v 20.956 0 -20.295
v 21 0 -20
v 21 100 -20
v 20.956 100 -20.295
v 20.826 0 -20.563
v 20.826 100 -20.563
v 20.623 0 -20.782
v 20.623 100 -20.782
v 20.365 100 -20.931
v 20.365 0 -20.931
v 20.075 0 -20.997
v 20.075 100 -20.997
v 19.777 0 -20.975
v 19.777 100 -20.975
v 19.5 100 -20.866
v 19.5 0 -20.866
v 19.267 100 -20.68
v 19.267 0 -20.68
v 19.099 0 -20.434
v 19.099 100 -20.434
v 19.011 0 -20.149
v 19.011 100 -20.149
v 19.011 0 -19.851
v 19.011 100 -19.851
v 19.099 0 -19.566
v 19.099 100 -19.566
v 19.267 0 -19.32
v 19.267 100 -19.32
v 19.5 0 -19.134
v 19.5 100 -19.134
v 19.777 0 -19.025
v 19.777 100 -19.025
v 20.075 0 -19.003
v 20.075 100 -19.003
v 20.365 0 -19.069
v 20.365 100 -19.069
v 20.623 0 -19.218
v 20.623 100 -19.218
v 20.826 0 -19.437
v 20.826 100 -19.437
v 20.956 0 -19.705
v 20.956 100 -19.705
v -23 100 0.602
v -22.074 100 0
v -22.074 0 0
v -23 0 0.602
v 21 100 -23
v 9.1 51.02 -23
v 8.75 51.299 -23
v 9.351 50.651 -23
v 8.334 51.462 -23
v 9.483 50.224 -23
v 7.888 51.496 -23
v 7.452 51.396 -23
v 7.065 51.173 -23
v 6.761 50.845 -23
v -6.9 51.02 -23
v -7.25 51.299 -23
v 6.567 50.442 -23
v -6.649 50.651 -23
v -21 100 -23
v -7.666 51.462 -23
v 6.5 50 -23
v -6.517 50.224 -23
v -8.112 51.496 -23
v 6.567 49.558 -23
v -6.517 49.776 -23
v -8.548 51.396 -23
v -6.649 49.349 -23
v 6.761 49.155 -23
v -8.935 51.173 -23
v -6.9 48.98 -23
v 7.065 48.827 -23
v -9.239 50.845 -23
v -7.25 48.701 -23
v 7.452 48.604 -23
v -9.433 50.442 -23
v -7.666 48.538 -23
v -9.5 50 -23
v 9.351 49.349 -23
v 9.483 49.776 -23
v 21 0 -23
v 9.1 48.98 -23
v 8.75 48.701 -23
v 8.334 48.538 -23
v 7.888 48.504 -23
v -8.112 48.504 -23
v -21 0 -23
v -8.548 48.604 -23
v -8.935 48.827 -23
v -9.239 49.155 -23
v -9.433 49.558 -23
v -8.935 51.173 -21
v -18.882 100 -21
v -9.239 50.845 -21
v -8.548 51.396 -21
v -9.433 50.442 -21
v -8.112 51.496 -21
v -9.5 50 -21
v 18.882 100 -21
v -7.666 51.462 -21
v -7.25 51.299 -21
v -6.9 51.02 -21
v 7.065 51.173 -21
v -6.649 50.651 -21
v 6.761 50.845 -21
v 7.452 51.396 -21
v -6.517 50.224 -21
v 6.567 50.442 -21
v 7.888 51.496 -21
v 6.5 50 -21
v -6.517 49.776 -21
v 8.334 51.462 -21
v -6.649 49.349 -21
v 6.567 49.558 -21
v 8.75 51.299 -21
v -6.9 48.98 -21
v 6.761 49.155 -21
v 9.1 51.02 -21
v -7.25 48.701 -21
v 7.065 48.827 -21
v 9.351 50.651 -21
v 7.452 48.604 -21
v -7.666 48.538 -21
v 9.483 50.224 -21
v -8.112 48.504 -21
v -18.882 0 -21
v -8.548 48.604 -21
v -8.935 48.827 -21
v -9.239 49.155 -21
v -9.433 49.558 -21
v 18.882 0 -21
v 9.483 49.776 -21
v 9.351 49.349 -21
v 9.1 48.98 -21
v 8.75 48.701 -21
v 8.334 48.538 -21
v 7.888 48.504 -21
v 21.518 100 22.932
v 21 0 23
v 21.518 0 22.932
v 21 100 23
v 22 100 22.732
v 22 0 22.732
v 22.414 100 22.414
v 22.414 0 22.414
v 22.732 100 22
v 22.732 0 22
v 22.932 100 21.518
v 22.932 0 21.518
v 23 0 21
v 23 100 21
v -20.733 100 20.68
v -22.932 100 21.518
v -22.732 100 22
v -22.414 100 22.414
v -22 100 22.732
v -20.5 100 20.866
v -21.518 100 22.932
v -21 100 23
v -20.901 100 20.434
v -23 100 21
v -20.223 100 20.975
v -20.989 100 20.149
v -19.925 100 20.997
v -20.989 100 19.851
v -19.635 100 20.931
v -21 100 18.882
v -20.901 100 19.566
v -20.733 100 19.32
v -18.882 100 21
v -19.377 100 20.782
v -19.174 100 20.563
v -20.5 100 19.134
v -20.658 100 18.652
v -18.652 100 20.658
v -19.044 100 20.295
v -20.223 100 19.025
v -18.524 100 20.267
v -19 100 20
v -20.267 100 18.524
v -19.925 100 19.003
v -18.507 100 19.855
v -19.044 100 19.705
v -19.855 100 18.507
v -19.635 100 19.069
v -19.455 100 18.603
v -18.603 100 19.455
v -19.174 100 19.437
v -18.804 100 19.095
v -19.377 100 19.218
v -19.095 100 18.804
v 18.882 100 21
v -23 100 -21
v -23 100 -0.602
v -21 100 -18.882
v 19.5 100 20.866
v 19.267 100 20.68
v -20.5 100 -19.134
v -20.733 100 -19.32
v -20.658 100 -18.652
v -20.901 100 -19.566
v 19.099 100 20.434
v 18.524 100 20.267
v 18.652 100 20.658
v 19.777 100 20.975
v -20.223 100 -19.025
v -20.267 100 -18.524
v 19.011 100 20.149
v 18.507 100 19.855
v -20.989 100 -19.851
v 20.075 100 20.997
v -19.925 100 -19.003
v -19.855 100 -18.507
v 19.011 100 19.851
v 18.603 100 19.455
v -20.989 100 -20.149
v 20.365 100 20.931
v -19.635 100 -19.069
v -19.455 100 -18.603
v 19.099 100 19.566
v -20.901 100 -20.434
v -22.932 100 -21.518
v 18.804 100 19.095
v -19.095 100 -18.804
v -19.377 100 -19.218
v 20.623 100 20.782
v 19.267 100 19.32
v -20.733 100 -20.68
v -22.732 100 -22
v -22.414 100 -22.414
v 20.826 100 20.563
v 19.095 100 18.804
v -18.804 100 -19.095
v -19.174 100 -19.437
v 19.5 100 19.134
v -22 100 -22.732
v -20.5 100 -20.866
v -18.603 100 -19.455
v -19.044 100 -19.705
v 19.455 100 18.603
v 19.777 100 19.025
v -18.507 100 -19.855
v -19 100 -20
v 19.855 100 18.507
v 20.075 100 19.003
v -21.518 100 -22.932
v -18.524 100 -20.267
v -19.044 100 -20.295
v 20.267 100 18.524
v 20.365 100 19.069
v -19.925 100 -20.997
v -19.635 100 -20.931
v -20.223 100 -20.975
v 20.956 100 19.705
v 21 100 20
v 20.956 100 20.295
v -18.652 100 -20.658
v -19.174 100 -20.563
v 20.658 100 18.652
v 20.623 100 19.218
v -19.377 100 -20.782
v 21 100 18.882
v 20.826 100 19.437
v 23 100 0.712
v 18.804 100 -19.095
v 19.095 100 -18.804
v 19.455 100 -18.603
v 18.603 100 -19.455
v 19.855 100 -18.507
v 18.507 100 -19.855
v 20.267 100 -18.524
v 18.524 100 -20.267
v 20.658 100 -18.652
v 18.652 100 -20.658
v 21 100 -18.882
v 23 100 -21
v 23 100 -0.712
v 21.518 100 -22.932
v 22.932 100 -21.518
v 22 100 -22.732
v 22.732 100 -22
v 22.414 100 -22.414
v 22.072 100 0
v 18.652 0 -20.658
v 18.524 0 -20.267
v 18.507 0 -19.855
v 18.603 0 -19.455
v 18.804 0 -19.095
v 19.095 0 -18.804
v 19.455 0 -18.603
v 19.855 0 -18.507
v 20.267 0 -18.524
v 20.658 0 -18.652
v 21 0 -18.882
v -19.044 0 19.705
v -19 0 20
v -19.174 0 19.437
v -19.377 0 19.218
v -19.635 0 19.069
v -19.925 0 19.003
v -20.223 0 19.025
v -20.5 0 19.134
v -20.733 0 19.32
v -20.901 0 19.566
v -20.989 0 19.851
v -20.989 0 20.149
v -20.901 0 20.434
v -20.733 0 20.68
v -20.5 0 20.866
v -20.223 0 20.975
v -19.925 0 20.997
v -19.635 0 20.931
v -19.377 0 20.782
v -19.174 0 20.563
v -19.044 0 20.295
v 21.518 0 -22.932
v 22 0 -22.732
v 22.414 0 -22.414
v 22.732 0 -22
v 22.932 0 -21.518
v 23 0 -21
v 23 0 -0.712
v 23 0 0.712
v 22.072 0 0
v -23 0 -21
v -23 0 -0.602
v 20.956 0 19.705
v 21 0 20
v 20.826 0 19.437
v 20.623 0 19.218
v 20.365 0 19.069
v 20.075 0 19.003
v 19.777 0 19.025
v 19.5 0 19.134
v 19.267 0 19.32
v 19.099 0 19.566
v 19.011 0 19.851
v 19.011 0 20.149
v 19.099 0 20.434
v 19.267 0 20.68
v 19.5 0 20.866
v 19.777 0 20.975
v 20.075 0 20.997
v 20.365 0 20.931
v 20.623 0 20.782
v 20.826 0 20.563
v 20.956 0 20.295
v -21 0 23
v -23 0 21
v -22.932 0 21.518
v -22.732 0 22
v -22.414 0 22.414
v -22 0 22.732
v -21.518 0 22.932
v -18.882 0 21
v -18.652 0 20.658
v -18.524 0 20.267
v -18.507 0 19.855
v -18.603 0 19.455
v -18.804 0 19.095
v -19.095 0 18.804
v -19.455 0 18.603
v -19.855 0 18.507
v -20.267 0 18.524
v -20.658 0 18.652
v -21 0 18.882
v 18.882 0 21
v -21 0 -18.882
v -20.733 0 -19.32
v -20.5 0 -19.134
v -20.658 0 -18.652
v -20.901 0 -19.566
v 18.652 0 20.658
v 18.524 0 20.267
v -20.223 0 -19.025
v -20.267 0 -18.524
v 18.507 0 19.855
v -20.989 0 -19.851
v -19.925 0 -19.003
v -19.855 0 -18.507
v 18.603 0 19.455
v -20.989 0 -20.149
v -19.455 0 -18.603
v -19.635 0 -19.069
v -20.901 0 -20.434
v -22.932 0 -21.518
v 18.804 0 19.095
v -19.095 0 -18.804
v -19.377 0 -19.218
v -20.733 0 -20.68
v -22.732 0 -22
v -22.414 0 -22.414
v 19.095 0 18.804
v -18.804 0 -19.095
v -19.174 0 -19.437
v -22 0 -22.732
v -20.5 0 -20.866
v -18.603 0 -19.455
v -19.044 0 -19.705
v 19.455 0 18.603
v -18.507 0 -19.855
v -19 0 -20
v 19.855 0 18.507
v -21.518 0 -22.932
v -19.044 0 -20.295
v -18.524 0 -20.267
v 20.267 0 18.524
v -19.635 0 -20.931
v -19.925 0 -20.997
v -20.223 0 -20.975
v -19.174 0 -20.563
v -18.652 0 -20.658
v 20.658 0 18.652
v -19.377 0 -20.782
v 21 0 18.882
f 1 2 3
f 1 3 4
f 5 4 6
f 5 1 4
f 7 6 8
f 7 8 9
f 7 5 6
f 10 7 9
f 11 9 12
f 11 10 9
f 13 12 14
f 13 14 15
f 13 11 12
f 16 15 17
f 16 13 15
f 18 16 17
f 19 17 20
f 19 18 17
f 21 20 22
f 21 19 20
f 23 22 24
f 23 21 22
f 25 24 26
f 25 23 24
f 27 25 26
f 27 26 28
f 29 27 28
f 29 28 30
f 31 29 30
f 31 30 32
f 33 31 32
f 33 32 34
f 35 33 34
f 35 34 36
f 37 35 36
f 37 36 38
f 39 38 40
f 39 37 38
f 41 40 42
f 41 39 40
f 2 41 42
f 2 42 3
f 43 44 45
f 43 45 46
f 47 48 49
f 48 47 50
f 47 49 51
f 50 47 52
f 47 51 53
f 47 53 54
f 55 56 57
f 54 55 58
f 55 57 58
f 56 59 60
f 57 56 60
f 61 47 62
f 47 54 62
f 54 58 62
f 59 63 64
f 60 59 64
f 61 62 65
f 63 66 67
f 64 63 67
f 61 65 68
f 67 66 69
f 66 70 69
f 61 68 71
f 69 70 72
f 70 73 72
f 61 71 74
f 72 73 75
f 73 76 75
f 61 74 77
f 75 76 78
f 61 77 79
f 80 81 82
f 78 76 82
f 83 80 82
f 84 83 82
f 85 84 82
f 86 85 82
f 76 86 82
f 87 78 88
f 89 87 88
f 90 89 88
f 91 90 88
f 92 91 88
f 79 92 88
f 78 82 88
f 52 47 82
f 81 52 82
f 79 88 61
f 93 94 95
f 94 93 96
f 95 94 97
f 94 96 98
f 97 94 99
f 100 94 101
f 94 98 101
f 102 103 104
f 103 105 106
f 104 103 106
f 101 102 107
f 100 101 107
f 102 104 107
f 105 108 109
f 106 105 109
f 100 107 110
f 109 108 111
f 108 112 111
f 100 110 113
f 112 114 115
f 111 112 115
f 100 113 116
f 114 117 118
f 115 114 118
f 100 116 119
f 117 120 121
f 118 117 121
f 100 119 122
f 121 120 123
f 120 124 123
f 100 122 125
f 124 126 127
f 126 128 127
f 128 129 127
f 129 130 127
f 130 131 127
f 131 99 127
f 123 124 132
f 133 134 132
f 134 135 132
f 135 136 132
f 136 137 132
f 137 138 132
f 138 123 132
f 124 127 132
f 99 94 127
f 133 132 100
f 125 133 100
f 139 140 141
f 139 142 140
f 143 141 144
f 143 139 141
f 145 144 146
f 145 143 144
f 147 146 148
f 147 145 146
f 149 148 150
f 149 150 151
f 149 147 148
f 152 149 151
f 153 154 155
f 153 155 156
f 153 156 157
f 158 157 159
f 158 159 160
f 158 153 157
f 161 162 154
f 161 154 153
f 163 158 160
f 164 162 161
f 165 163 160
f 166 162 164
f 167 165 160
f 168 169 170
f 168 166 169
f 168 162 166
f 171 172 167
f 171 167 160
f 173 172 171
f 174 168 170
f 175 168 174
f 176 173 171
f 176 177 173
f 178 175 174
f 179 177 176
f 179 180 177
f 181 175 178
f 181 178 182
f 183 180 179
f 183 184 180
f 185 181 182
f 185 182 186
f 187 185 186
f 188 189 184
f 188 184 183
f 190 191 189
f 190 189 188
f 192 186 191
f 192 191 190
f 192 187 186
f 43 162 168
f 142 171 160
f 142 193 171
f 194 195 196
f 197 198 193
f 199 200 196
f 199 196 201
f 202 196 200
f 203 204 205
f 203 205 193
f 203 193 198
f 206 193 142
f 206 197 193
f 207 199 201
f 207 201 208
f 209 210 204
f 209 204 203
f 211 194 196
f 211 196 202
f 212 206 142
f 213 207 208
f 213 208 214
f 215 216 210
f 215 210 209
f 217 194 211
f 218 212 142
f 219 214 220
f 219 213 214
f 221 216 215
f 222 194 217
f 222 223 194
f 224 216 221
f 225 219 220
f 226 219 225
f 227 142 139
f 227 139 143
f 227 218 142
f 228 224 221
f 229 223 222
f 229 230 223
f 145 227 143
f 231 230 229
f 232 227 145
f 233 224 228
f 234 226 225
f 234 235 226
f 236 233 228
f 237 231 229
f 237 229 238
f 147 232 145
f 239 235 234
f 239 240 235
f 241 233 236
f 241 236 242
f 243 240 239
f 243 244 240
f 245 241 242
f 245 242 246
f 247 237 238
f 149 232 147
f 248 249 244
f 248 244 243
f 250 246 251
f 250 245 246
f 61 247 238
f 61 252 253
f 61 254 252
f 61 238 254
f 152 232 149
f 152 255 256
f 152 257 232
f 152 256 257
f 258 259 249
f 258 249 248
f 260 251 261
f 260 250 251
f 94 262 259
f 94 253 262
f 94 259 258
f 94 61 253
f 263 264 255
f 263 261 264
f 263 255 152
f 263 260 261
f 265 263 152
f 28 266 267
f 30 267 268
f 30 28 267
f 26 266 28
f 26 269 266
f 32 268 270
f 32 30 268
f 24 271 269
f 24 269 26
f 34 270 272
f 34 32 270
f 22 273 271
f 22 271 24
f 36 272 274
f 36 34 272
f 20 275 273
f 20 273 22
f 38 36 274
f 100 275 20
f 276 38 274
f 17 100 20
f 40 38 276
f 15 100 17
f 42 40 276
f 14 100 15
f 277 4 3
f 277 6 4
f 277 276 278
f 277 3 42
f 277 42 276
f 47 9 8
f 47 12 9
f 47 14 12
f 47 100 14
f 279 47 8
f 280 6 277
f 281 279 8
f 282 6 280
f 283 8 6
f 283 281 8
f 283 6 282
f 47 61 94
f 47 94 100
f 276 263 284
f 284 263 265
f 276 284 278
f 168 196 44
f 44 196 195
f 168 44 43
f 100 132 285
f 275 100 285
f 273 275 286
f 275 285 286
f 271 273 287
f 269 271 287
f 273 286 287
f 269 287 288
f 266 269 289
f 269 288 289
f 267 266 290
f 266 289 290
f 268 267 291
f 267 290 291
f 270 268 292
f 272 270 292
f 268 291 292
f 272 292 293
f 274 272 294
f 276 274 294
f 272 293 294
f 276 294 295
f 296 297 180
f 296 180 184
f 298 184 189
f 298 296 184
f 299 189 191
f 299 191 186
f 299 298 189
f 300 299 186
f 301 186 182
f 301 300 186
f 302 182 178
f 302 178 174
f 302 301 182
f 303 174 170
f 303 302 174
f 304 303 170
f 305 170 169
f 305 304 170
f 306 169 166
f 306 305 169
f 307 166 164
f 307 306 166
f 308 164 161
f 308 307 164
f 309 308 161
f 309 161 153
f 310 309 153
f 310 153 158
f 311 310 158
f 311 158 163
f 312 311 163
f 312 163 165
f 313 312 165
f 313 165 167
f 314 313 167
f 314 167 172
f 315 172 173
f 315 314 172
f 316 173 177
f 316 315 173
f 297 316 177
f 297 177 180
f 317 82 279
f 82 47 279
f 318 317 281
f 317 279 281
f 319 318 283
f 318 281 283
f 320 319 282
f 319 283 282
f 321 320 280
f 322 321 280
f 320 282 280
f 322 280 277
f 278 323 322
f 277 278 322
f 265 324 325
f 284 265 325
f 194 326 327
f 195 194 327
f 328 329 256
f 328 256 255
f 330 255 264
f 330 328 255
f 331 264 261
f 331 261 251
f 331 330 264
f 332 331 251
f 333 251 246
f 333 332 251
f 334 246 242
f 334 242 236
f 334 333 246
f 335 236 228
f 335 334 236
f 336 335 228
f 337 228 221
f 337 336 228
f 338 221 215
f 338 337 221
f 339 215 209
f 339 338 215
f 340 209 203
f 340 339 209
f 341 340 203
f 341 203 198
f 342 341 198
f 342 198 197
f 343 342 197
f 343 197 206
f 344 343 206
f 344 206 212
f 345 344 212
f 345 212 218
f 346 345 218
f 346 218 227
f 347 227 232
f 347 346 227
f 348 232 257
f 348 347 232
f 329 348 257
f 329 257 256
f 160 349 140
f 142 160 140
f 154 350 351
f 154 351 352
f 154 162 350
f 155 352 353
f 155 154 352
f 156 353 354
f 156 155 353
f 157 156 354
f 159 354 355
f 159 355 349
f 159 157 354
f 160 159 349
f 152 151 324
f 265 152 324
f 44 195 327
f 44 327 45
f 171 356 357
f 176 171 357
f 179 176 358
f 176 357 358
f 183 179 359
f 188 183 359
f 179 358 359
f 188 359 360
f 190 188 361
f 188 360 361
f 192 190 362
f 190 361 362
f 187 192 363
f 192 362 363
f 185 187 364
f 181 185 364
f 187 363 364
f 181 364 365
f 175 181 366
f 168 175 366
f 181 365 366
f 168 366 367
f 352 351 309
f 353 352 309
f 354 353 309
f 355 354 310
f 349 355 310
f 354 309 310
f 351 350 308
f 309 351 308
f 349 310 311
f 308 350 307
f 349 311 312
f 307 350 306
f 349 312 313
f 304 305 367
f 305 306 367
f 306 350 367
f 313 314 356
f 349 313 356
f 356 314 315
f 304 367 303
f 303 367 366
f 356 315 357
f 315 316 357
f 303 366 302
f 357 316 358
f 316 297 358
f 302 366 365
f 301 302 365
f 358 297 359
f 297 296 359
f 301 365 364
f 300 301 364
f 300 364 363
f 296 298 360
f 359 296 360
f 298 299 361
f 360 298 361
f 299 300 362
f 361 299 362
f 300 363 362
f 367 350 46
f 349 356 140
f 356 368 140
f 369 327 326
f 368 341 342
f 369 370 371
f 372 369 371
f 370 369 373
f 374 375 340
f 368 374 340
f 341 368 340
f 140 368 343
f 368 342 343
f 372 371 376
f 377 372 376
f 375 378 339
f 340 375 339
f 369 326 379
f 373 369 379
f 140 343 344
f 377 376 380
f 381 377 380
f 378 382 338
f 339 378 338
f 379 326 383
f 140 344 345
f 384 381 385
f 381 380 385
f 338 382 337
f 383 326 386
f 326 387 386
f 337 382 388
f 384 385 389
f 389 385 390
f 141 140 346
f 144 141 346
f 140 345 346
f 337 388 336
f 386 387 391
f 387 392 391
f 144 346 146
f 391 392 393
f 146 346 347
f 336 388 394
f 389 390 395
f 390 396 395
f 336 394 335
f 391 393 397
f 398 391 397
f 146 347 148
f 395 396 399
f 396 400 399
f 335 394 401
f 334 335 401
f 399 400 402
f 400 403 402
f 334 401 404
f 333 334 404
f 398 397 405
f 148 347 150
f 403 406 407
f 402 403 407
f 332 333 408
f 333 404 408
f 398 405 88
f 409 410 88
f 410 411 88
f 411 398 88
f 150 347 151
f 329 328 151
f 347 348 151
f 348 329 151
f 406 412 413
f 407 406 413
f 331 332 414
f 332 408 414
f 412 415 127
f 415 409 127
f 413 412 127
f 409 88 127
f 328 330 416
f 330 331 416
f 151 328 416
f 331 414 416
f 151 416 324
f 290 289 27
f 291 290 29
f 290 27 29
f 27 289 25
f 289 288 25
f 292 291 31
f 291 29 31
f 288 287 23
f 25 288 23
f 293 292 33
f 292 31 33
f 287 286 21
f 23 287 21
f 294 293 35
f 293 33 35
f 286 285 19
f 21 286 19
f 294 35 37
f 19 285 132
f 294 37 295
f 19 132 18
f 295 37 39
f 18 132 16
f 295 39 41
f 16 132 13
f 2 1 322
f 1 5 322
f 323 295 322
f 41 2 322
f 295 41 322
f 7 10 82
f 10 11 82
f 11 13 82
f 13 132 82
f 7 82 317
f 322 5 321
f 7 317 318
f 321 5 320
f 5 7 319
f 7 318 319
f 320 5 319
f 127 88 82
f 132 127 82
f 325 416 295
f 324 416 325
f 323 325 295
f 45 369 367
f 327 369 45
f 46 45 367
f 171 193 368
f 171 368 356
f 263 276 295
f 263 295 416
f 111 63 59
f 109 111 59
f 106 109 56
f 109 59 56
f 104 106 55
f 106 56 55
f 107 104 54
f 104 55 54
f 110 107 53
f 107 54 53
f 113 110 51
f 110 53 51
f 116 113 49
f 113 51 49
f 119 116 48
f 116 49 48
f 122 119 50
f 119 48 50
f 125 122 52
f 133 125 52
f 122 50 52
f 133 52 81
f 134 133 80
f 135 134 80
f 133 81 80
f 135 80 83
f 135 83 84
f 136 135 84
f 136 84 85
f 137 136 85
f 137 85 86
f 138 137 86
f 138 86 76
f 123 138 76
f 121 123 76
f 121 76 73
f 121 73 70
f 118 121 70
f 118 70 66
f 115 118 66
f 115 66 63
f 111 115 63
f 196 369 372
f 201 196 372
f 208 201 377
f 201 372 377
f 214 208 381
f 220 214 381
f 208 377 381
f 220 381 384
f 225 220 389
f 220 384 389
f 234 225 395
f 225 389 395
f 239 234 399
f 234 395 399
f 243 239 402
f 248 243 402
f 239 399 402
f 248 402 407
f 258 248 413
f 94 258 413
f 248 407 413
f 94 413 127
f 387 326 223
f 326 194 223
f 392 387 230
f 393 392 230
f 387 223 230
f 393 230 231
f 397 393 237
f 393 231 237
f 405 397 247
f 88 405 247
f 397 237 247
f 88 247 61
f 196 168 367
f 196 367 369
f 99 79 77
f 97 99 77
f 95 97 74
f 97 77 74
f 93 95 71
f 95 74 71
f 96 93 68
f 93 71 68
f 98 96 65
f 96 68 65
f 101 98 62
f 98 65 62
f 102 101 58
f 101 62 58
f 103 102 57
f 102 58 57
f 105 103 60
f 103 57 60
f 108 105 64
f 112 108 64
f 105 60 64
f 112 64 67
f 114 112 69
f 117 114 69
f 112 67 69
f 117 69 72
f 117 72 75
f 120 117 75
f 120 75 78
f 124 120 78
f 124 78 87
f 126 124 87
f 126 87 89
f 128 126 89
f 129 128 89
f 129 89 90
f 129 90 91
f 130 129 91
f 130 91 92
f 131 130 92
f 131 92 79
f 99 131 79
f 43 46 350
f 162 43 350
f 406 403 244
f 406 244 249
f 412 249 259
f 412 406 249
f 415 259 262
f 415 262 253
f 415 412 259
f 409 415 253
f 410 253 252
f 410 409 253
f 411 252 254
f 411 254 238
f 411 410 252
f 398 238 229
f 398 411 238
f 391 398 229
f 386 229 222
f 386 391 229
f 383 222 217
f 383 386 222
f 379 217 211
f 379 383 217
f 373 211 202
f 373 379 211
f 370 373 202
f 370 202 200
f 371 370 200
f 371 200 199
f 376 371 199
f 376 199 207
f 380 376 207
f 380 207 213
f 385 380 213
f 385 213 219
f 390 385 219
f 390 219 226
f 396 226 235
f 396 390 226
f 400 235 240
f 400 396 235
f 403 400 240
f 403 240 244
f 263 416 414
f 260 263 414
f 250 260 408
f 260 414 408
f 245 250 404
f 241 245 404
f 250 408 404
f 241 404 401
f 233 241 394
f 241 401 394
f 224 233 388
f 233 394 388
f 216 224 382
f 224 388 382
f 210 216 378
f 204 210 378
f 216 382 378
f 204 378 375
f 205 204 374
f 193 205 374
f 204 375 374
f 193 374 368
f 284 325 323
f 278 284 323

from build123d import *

# Parameters (mm, degrees)
SKETCH1_R           = 1
BOSS_EXTRUDE1_DEPTH = 100
FILLET1_R           = 2
CUT_EXTRUDE2_REACH  = 48
SKETCH3_R           = 1.5
FILLET2_R           = 2


with BuildPart() as part:
    # Sketch1 → Boss-Extrude1 (new body)
    with BuildSketch(Plane(origin=(0, 0, 0), x_dir=(1, 0, 0), z_dir=(0, 1, 0))):
        Polygon((-23, 0.601609353), (-22.074492009, 0), (-23, -0.601609353), (-23, -23), (23, -23), (23, -0.712327005), (22.071835016, 0), (23, 0.712327005), (23, 23), (-23, 23), align=None)
        with Locations((-20, 20)):
            Circle(SKETCH1_R, mode=Mode.SUBTRACT)
        with Locations((20, 20)):
            Circle(SKETCH1_R, mode=Mode.SUBTRACT)
        with Locations((20, -20)):
            Circle(SKETCH1_R, mode=Mode.SUBTRACT)
        with Locations((-20, -20)):
            Circle(SKETCH1_R, mode=Mode.SUBTRACT)
        with BuildLine():
            Line((-18.881966011, 21), (18.881966011, 21))
            ThreePointArc((18.881966011, 21), (18.939339828, 18.939339828), (21, 18.881966011))
            Line((21, 18.881966011), (21, -18.881966011))
            ThreePointArc((21, -18.881966011), (18.939339828, -18.939339828), (18.881966011, -21))
            Line((18.881966011, -21), (-18.881966011, -21))
            ThreePointArc((-18.881966011, -21), (-18.939339828, -18.939339828), (-21, -18.881966011))
            Line((-21, -18.881966011), (-21, 18.881966011))
            ThreePointArc((-21, 18.881966011), (-18.939339828, 18.939339828), (-18.881966011, 21))
        make_face(mode=Mode.SUBTRACT)
    extrude(amount=BOSS_EXTRUDE1_DEPTH)

    # Fillet1
    fillet1_edges = [part.edges().sort_by_distance(p)[0] for p in [
        (-23, 50, -23),
        (23, 50, -23),
    ]]
    fillet(fillet1_edges, radius=FILLET1_R)

    # Sketch3 → Cut-Extrude2 (cut, up to next)
    with BuildSketch(Plane(origin=(0, 0, -23), x_dir=(-1, 0, 0), z_dir=(0, 0, -1)), mode=Mode.PRIVATE) as cut_extrude2_sk1:
        with Locations((8, 50)):
            Circle(SKETCH3_R)
    cut_extrude2_tool1 = extrude(cut_extrude2_sk1.sketch, amount=-CUT_EXTRUDE2_REACH, mode=Mode.PRIVATE) & part.part
    add(cut_extrude2_tool1.solids().sort_by_distance((-8, 50, -23))[0], mode=Mode.SUBTRACT)
    # Sketch3 → Cut-Extrude2 (cut, up to next)
    with BuildSketch(Plane(origin=(0, 0, -23), x_dir=(-1, 0, 0), z_dir=(0, 0, -1)), mode=Mode.PRIVATE) as cut_extrude2_sk2:
        with Locations((-8, 50)):
            Circle(SKETCH3_R)
    cut_extrude2_tool2 = extrude(cut_extrude2_sk2.sketch, amount=-CUT_EXTRUDE2_REACH, mode=Mode.PRIVATE) & part.part
    add(cut_extrude2_tool2.solids().sort_by_distance((8, 50, -23))[0], mode=Mode.SUBTRACT)

    # Fillet2
    fillet2_edges = [part.edges().sort_by_distance(p)[0] for p in [
        (23, 50, 23),
        (-23, 50, 23),
    ]]
    fillet(fillet2_edges, radius=FILLET2_R)


solid = part.part
